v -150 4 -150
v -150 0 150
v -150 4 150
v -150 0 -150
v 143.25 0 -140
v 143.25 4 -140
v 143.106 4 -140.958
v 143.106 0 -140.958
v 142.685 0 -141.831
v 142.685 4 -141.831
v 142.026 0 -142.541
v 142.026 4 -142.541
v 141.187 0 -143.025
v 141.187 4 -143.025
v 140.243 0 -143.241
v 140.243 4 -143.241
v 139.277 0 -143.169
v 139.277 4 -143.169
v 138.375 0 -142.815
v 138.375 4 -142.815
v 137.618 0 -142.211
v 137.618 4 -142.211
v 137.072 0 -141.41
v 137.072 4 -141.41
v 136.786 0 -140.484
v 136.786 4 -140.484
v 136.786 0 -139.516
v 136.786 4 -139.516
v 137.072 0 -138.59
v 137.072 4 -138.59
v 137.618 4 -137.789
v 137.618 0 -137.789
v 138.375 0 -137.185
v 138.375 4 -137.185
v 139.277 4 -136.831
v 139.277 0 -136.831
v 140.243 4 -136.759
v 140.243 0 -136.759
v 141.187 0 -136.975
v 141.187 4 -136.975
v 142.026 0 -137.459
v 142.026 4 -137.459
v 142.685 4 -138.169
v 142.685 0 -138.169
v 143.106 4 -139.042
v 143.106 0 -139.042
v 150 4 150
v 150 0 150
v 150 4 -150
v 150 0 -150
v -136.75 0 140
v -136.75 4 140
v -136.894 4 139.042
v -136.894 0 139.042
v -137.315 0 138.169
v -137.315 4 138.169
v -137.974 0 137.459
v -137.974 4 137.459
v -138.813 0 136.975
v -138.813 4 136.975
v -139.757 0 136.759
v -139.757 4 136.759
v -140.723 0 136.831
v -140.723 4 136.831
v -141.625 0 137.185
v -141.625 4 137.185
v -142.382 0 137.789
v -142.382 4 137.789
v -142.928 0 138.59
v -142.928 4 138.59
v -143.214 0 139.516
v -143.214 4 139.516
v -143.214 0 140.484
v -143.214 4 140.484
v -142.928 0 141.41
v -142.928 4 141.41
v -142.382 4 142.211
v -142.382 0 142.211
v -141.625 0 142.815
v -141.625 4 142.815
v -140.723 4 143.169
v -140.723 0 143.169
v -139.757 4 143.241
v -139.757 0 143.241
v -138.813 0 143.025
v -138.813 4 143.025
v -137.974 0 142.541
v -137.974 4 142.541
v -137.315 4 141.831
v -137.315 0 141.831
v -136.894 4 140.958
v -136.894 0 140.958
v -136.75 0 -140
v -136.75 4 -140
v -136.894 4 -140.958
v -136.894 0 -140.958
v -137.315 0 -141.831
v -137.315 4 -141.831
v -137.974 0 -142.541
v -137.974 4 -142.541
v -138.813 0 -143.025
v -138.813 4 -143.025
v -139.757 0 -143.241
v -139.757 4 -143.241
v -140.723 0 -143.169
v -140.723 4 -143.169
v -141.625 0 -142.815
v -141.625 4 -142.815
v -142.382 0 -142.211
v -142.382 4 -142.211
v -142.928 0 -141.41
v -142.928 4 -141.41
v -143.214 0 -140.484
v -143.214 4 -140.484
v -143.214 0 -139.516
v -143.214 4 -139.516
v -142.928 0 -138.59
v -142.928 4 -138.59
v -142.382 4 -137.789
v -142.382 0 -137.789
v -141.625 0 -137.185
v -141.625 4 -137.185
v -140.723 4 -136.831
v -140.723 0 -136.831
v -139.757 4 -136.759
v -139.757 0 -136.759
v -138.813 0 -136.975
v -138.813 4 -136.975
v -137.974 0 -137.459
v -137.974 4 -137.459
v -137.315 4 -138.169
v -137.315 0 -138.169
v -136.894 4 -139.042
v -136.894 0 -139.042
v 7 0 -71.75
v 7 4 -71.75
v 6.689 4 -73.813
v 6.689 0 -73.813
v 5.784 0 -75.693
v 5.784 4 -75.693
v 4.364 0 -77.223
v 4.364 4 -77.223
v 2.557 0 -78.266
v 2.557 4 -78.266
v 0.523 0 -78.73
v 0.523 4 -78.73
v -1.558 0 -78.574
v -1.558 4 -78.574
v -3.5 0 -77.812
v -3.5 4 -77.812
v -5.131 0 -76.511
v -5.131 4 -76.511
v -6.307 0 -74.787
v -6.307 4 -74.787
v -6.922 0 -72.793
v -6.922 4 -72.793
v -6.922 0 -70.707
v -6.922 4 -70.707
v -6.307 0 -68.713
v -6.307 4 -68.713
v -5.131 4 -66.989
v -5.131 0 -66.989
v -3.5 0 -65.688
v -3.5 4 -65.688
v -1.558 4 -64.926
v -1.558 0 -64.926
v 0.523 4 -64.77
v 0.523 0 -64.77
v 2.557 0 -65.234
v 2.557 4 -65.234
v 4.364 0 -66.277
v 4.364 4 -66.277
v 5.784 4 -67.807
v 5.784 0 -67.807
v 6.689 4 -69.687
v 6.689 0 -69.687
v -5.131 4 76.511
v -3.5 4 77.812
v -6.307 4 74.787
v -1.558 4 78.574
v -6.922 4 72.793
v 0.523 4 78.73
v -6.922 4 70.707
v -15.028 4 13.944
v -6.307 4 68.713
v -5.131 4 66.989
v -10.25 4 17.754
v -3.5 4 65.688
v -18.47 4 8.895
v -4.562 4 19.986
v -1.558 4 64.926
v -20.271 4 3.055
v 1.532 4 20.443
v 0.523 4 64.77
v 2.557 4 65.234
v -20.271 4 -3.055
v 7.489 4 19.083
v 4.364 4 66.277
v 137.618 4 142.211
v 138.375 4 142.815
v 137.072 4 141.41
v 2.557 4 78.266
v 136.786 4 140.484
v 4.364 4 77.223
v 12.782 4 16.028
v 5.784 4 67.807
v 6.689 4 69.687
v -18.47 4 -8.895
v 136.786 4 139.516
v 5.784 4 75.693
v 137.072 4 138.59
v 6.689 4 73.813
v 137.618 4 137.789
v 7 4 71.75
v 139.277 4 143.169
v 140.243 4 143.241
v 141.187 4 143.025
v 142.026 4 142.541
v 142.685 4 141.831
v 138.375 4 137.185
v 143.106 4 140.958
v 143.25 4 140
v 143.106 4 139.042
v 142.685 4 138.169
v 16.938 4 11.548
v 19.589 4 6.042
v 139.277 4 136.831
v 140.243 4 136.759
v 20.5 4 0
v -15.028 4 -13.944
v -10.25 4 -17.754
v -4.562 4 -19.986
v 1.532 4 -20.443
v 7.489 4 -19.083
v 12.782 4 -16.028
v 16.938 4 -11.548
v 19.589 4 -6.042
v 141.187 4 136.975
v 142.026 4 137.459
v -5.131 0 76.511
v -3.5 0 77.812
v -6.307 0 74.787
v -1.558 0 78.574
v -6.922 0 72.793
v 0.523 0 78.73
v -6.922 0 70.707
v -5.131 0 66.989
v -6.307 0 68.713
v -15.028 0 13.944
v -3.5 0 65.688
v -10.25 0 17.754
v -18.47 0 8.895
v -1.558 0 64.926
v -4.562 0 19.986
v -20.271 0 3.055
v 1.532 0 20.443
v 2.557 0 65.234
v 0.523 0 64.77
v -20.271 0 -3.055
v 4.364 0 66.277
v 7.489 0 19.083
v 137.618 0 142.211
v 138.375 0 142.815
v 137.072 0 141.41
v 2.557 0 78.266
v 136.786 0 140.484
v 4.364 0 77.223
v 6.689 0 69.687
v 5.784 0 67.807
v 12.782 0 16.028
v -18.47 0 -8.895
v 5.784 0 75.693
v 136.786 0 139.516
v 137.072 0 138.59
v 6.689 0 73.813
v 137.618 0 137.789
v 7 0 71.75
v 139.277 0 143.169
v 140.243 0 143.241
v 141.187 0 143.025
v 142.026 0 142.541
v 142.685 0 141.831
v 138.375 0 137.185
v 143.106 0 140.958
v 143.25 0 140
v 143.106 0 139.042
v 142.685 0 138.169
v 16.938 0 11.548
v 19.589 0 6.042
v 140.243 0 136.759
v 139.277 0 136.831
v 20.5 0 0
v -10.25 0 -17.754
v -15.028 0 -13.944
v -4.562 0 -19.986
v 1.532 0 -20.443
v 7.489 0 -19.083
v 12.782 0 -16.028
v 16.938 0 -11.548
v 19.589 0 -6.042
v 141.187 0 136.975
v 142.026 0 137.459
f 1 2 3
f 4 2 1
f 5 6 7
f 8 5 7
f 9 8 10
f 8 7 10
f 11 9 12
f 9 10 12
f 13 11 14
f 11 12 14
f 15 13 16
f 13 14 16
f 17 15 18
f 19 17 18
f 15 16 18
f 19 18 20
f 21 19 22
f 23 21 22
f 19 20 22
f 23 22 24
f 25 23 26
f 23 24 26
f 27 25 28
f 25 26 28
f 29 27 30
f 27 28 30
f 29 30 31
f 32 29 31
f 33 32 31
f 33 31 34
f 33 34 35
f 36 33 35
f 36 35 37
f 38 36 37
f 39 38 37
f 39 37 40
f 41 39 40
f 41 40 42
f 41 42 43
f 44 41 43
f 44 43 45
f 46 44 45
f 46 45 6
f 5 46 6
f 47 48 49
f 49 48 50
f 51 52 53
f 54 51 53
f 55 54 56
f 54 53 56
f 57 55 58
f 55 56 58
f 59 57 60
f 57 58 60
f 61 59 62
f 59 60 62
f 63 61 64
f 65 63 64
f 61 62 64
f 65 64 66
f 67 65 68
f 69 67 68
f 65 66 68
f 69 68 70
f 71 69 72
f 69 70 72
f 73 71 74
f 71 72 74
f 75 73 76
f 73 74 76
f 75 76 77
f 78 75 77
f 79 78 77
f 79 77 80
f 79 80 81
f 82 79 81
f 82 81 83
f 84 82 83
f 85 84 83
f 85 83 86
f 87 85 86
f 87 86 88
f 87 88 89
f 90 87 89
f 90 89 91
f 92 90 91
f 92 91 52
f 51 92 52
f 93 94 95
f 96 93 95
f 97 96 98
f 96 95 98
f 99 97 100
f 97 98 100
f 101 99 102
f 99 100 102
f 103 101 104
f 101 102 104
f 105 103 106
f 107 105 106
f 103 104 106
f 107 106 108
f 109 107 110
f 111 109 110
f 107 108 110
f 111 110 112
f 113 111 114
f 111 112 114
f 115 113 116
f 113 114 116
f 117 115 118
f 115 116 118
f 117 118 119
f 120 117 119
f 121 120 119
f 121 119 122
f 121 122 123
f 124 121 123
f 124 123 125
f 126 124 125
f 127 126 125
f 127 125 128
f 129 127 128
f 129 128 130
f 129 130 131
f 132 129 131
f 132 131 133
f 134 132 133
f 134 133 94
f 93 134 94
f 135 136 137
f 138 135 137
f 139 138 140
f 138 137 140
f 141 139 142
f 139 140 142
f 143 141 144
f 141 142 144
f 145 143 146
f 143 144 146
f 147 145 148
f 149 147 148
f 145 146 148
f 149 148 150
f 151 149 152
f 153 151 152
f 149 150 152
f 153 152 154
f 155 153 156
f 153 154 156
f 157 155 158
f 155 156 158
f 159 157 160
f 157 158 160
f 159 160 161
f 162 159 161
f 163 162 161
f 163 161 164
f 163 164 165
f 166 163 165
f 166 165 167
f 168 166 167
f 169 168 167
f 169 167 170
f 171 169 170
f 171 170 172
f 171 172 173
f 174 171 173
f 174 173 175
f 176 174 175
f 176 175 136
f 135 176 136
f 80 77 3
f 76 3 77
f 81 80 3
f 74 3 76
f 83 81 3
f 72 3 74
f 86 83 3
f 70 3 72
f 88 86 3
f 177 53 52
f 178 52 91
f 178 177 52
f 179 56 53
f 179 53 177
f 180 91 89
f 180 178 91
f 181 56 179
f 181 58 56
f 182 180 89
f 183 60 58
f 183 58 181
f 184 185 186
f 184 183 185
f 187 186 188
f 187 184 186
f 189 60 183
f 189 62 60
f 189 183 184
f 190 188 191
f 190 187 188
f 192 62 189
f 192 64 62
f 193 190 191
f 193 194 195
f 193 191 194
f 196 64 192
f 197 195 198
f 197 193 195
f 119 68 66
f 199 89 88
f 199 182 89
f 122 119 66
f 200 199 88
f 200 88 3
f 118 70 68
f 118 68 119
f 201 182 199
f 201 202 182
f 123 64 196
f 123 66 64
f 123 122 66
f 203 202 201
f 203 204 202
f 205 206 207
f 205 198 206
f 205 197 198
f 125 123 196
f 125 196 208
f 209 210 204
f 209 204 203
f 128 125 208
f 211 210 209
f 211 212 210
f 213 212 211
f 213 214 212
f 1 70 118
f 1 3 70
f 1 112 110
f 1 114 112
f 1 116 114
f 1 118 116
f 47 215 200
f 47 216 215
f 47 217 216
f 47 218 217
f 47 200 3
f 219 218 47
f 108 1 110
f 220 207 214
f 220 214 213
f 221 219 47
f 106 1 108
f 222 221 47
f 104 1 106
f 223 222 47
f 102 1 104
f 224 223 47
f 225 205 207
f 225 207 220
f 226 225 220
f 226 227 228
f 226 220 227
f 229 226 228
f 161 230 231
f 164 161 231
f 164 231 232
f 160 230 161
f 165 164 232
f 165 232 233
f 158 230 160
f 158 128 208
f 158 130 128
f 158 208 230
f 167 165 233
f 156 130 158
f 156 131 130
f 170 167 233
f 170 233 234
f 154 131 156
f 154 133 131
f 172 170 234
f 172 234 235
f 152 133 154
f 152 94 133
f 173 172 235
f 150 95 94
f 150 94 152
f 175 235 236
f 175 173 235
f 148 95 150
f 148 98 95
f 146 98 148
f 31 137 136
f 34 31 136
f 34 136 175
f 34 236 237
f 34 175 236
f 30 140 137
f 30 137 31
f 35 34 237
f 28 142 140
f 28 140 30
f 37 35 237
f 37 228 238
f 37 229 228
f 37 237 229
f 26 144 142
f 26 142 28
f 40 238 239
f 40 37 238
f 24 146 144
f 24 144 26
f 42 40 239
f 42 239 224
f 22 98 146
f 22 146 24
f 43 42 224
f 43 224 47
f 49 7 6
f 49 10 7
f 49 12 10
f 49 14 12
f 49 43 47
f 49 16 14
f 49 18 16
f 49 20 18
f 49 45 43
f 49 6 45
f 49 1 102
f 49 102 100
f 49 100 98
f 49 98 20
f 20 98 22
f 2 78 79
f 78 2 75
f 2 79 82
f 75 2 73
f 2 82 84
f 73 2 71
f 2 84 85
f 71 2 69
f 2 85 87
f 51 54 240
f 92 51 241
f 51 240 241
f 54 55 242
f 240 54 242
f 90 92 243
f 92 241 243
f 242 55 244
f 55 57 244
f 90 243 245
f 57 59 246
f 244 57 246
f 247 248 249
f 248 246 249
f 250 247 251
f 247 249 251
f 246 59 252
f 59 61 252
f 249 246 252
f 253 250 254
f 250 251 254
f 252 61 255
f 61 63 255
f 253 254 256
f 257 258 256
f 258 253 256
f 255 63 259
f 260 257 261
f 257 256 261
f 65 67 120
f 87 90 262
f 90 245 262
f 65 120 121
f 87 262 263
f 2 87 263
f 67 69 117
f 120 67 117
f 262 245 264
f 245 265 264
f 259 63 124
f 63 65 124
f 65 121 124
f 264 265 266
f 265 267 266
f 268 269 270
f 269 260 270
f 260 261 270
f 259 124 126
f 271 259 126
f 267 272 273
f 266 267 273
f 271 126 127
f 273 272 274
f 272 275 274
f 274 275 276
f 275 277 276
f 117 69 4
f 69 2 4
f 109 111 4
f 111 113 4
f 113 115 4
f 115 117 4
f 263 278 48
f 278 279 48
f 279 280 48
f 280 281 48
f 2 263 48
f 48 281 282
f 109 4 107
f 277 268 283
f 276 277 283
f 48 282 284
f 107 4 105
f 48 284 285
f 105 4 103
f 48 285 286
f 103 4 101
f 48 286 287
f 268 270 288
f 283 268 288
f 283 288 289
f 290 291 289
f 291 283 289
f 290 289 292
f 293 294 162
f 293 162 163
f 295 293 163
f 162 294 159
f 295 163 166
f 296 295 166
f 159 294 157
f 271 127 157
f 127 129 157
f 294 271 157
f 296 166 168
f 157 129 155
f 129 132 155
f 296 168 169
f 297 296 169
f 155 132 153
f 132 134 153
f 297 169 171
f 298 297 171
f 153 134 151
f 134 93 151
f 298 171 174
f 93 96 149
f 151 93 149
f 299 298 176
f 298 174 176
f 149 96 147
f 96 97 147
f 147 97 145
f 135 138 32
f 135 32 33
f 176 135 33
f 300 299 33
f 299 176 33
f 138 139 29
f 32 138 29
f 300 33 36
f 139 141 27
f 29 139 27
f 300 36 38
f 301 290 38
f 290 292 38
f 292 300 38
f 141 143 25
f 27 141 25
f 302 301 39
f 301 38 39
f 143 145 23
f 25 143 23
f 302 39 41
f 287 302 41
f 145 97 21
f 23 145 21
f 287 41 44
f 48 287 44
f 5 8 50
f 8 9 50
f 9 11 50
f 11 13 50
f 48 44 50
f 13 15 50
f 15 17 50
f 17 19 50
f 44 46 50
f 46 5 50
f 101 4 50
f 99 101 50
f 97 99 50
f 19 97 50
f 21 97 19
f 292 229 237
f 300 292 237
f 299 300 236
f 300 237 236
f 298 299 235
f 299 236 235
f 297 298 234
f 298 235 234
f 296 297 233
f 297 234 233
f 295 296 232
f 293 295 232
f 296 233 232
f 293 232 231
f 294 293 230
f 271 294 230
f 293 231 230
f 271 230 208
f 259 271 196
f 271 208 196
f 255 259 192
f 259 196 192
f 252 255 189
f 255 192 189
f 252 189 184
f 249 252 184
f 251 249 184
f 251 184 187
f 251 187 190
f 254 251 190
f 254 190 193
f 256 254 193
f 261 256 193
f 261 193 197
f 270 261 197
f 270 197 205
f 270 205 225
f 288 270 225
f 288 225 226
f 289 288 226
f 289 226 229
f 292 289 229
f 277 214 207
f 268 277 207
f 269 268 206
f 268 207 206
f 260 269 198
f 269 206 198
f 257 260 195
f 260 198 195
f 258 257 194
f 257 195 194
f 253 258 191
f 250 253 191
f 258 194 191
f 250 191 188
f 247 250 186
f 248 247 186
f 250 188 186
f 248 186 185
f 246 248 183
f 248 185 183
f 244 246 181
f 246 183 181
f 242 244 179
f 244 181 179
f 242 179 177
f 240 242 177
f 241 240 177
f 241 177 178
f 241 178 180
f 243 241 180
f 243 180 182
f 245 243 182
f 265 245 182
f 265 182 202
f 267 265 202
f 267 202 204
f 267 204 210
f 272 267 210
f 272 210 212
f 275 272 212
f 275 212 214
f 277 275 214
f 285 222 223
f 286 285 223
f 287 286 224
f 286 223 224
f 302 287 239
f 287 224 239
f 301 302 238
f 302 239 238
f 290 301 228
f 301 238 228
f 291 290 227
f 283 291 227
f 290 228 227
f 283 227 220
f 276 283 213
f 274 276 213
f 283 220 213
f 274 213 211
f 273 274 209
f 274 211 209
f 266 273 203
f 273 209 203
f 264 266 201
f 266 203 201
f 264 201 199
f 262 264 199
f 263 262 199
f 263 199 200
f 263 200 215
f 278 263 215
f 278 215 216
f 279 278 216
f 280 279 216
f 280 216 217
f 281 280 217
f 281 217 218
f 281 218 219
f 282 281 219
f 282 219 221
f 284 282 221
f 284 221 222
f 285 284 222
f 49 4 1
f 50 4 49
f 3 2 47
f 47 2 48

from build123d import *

# Parameters (mm, degrees)
SKETCH1_W           = 300
SKETCH1_H           = 300
BOSS_EXTRUDE1_DEPTH = 4
CUT_EXTRUDE1_REACH  = 6
SKETCH2_R           = 3.25
CUT_EXTRUDE2_REACH  = 6
SKETCH3_R           = 20.5
CUT_EXTRUDE3_REACH  = 6
SKETCH4_R           = 7


with BuildPart() as part:
    # Sketch1 → Boss-Extrude1 (new body)
    with BuildSketch(Plane(origin=(0, 0, 0), x_dir=(1, 0, 0), z_dir=(0, 1, 0))):
        Rectangle(SKETCH1_W, SKETCH1_H)
    extrude(amount=BOSS_EXTRUDE1_DEPTH)

    # Sketch2 → Cut-Extrude1 (cut, up to next)
    with BuildSketch(Plane(origin=(0, 4, 0), x_dir=(1, 0, 0), z_dir=(0, 1, 0)), mode=Mode.PRIVATE) as cut_extrude1_sk1:
        with Locations((-140, 140)):
            Circle(SKETCH2_R)
    cut_extrude1_tool1 = extrude(cut_extrude1_sk1.sketch, amount=-CUT_EXTRUDE1_REACH, mode=Mode.PRIVATE) & part.part
    add(cut_extrude1_tool1.solids().sort_by_distance((-140, 4, -140))[0], mode=Mode.SUBTRACT)
    # Sketch2 → Cut-Extrude1 (cut, up to next)
    with BuildSketch(Plane(origin=(0, 4, 0), x_dir=(1, 0, 0), z_dir=(0, 1, 0)), mode=Mode.PRIVATE) as cut_extrude1_sk2:
        with Locations((140, 140)):
            Circle(SKETCH2_R)
    cut_extrude1_tool2 = extrude(cut_extrude1_sk2.sketch, amount=-CUT_EXTRUDE1_REACH, mode=Mode.PRIVATE) & part.part
    add(cut_extrude1_tool2.solids().sort_by_distance((140, 4, -140))[0], mode=Mode.SUBTRACT)
    # Sketch2 → Cut-Extrude1 (cut, up to next)
    with BuildSketch(Plane(origin=(0, 4, 0), x_dir=(1, 0, 0), z_dir=(0, 1, 0)), mode=Mode.PRIVATE) as cut_extrude1_sk3:
        with Locations((140, -140)):
            Circle(SKETCH2_R)
    cut_extrude1_tool3 = extrude(cut_extrude1_sk3.sketch, amount=-CUT_EXTRUDE1_REACH, mode=Mode.PRIVATE) & part.part
    add(cut_extrude1_tool3.solids().sort_by_distance((140, 4, 140))[0], mode=Mode.SUBTRACT)
    # Sketch2 → Cut-Extrude1 (cut, up to next)
    with BuildSketch(Plane(origin=(0, 4, 0), x_dir=(1, 0, 0), z_dir=(0, 1, 0)), mode=Mode.PRIVATE) as cut_extrude1_sk4:
        with Locations((-140, -140)):
            Circle(SKETCH2_R)
    cut_extrude1_tool4 = extrude(cut_extrude1_sk4.sketch, amount=-CUT_EXTRUDE1_REACH, mode=Mode.PRIVATE) & part.part
    add(cut_extrude1_tool4.solids().sort_by_distance((-140, 4, 140))[0], mode=Mode.SUBTRACT)

    # Sketch3 → Cut-Extrude2 (cut, up to next)
    with BuildSketch(Plane(origin=(0, 4, 0), x_dir=(1, 0, 0), z_dir=(0, 1, 0)), mode=Mode.PRIVATE) as cut_extrude2_sk1:
        Circle(SKETCH3_R)
    cut_extrude2_tool1 = extrude(cut_extrude2_sk1.sketch, amount=-CUT_EXTRUDE2_REACH, mode=Mode.PRIVATE) & part.part
    add(cut_extrude2_tool1.solids().sort_by_distance((0, 4, 0))[0], mode=Mode.SUBTRACT)

    # Sketch4 → Cut-Extrude3 (cut, up to next)
    with BuildSketch(Plane(origin=(0, 4, 0), x_dir=(1, 0, 0), z_dir=(0, 1, 0)), mode=Mode.PRIVATE) as cut_extrude3_sk1:
        with Locations((0, 71.75)):
            Circle(SKETCH4_R)
    cut_extrude3_tool1 = extrude(cut_extrude3_sk1.sketch, amount=-CUT_EXTRUDE3_REACH, mode=Mode.PRIVATE) & part.part
    add(cut_extrude3_tool1.solids().sort_by_distance((0, 4, -71.75))[0], mode=Mode.SUBTRACT)
    # Sketch4 → Cut-Extrude3 (cut, up to next)
    with BuildSketch(Plane(origin=(0, 4, 0), x_dir=(1, 0, 0), z_dir=(0, 1, 0)), mode=Mode.PRIVATE) as cut_extrude3_sk2:
        with Locations((0, -71.75)):
            Circle(SKETCH4_R)
    cut_extrude3_tool2 = extrude(cut_extrude3_sk2.sketch, amount=-CUT_EXTRUDE3_REACH, mode=Mode.PRIVATE) & part.part
    add(cut_extrude3_tool2.solids().sort_by_distance((0, 4, 71.75))[0], mode=Mode.SUBTRACT)


solid = part.part
